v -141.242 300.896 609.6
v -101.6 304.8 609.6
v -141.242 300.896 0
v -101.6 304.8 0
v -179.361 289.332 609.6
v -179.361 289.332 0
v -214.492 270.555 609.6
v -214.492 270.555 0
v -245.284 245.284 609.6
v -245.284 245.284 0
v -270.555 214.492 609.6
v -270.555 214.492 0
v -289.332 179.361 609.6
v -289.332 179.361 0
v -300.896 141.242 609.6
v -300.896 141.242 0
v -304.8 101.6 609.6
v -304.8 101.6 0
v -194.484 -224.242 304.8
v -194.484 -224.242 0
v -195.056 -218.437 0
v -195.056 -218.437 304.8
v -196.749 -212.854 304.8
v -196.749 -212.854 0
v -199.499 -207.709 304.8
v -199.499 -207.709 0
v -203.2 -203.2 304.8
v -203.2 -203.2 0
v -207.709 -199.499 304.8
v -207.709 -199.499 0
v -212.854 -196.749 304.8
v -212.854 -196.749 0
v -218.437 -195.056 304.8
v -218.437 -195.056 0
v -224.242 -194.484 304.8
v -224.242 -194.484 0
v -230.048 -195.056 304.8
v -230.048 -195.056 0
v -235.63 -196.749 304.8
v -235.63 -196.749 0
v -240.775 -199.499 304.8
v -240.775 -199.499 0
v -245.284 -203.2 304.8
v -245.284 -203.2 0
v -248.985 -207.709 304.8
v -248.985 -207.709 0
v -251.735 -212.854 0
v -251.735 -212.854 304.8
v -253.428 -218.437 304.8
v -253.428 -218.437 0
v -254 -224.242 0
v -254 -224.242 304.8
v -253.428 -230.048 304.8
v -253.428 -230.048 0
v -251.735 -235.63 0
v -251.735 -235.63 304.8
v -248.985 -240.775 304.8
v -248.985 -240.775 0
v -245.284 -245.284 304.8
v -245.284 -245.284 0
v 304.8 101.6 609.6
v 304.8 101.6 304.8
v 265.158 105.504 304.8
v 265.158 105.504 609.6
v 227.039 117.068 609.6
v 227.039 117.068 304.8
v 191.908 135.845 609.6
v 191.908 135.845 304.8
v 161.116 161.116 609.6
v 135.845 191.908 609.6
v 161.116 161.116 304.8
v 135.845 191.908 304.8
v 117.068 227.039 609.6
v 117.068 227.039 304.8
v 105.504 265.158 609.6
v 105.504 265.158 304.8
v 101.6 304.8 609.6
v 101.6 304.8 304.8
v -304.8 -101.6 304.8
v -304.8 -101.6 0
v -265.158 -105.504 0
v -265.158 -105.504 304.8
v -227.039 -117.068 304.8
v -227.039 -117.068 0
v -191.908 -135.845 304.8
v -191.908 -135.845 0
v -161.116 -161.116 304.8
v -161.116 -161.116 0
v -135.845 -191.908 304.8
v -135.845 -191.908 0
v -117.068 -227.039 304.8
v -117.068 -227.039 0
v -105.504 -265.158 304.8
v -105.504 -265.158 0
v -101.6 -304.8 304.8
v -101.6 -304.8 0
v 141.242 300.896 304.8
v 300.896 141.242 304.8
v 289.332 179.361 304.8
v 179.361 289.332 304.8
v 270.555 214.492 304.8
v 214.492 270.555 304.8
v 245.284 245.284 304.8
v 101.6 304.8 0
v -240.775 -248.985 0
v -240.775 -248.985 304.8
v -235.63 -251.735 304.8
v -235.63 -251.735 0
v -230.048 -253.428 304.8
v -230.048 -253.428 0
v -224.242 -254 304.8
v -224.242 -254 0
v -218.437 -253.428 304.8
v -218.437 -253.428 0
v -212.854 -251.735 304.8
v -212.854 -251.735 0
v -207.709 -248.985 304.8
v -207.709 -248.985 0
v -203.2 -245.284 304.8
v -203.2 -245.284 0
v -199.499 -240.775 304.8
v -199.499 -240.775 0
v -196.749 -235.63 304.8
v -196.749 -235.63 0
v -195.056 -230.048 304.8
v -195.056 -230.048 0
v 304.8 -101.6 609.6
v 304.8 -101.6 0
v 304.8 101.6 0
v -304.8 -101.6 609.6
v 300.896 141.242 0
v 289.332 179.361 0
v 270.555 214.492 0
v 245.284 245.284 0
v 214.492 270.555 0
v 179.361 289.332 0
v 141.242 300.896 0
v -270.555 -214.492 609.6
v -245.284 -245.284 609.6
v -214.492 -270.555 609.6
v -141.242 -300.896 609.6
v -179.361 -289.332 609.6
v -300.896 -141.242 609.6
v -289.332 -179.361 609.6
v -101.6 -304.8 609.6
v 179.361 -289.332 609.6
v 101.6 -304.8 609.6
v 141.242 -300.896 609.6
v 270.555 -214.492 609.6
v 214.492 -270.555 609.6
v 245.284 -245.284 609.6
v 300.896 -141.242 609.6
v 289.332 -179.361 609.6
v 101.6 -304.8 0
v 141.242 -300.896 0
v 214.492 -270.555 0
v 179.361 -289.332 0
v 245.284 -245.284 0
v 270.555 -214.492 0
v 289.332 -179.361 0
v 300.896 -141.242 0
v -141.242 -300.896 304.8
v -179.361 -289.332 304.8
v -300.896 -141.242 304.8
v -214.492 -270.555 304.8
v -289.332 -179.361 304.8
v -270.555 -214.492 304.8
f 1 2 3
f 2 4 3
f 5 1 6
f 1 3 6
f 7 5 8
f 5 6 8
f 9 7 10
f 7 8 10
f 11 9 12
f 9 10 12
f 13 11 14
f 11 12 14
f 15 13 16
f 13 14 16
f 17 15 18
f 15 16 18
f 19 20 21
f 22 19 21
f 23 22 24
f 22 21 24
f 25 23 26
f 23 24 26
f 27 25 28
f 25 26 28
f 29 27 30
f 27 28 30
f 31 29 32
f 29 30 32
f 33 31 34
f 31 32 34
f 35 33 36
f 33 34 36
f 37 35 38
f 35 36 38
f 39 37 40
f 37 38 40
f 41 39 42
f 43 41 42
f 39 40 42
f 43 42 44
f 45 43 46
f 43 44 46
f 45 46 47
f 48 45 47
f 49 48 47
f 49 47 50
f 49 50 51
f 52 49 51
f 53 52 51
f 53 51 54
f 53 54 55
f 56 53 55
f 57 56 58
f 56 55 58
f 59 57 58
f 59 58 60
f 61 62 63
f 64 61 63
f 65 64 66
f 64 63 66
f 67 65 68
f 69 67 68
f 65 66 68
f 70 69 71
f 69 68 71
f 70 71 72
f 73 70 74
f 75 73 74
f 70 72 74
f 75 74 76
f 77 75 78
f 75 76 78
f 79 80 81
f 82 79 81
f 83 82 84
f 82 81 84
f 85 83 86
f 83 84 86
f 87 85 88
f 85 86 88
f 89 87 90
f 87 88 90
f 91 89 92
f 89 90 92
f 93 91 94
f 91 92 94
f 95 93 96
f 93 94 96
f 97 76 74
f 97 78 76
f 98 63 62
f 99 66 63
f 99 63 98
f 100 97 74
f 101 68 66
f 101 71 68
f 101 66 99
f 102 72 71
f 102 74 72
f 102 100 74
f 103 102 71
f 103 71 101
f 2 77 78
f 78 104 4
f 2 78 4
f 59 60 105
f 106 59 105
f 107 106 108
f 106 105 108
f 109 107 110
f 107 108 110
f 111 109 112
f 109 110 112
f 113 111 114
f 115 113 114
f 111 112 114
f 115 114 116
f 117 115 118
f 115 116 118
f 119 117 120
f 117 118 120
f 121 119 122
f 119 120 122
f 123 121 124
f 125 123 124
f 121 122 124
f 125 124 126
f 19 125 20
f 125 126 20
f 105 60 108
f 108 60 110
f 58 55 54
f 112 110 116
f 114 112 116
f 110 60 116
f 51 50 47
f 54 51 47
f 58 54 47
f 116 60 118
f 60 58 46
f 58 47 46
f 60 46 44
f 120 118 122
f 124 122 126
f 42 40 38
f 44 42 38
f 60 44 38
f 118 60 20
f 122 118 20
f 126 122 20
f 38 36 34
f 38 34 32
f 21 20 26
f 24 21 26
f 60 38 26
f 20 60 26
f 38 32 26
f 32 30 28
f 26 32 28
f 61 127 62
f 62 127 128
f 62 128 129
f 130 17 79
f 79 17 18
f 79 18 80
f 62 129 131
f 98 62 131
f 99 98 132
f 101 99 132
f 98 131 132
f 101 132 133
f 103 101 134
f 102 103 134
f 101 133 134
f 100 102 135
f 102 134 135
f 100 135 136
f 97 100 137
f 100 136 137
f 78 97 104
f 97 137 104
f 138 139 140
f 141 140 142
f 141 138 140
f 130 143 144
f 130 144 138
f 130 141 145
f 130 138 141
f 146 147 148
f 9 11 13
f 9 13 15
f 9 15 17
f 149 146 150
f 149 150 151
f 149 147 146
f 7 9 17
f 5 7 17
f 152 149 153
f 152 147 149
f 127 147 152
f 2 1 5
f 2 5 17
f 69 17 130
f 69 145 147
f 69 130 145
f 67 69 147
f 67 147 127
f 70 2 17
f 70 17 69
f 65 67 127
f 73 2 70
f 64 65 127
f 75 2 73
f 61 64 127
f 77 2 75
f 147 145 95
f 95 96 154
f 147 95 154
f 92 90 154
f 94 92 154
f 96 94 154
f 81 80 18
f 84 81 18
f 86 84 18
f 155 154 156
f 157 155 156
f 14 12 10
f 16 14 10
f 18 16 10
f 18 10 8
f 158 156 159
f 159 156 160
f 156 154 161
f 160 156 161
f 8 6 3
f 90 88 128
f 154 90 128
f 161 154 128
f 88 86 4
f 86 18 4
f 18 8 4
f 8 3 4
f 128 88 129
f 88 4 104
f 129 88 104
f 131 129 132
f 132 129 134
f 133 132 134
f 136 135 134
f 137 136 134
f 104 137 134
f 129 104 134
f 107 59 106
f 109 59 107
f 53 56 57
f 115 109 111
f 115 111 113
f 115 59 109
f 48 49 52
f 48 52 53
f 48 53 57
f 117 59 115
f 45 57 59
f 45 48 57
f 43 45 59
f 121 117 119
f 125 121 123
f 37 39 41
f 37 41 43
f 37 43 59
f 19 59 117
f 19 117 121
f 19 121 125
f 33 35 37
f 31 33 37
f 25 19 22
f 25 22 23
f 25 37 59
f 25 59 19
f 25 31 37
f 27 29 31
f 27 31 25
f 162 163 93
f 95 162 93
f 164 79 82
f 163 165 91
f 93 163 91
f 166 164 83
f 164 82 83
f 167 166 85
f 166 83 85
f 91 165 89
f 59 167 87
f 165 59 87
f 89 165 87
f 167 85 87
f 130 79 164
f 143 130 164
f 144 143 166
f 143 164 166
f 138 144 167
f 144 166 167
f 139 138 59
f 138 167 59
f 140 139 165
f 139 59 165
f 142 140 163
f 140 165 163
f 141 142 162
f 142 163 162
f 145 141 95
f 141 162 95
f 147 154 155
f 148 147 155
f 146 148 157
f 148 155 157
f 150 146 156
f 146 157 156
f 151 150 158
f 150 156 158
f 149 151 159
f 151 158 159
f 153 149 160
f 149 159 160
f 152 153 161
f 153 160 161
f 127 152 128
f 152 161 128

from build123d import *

# Parameters (mm, degrees)
F1_DEPTH = 304.8
F3_DEPTH = 304.8


# Not quite as in the source:
# - the program builds the solid bodies; features that only make, move or delete a surface that nothing else refers to are left out


with BuildPart() as f1:
    # F0 (on Top) → F1 (new body)
    with BuildSketch(Plane.XY):
        with BuildLine():
            Line((-101.6, -304.8), (101.6, -304.8))
            ThreePointArc((101.6, -304.8), (245.2840979371, -245.2840979371), (304.8, -101.6))
            Line((304.8, -101.6), (304.8, 101.6))
            ThreePointArc((304.8, 101.6), (161.1159020629, 161.1159020629), (101.6, 304.8))
            Line((101.6, 304.8), (-101.6, 304.8))
            ThreePointArc((-101.6, 304.8), (-245.2840979371, 245.2840979371), (-304.8, 101.6))
            Line((-304.8, 101.6), (-304.8, -101.6))
            ThreePointArc((-304.8, -101.6), (-161.1159020629, -161.1159020629), (-101.6, -304.8))
        make_face()
        with BuildLine():
            ThreePointArc((101.6, 304.8), (161.1159020629, 161.1159020629), (304.8, 101.6))
            ThreePointArc((304.8, 101.6), (245.2840979371, 245.2840979371), (101.6, 304.8))
        make_face()
    extrude(amount=F1_DEPTH)

    # F2 (on face) → F3 (join)
    with BuildSketch(Plane.XY.offset(304.8)):
        with BuildLine():
            Line((304.8, -101.6), (304.8, 101.6))
            ThreePointArc((304.8, 101.6), (161.1159020629, 161.1159020629), (101.6, 304.8))
            Line((101.6, 304.8), (-101.6, 304.8))
            ThreePointArc((-101.6, 304.8), (-245.2840979371, 245.2840979371), (-304.8, 101.6))
            Line((-304.8, 101.6), (-304.8, -101.6))
            ThreePointArc((-304.8, -101.6), (-245.2840979371, -245.2840979371), (-101.6, -304.8))
            Line((-101.6, -304.8), (101.6, -304.8))
            ThreePointArc((101.6, -304.8), (245.2840979371, -245.2840979371), (304.8, -101.6))
        make_face()
    extrude(amount=F3_DEPTH)


with BuildPart() as f1b:
    # F0 (on Top) → F1, piece 2 (new body)
    with BuildSketch(Plane.XY):
        with BuildLine():
            ThreePointArc((-194.4840979371, -224.2420489686), (-235.6299238094, -196.7492870811), (-245.2840979371, -245.2840979371))
            ThreePointArc((-245.2840979371, -245.2840979371), (-212.8541741277, -251.734810856), (-194.4840979371, -224.2420489686))
        make_face()
    extrude(amount=F1_DEPTH)


solid = Compound([f1.part, f1b.part])
